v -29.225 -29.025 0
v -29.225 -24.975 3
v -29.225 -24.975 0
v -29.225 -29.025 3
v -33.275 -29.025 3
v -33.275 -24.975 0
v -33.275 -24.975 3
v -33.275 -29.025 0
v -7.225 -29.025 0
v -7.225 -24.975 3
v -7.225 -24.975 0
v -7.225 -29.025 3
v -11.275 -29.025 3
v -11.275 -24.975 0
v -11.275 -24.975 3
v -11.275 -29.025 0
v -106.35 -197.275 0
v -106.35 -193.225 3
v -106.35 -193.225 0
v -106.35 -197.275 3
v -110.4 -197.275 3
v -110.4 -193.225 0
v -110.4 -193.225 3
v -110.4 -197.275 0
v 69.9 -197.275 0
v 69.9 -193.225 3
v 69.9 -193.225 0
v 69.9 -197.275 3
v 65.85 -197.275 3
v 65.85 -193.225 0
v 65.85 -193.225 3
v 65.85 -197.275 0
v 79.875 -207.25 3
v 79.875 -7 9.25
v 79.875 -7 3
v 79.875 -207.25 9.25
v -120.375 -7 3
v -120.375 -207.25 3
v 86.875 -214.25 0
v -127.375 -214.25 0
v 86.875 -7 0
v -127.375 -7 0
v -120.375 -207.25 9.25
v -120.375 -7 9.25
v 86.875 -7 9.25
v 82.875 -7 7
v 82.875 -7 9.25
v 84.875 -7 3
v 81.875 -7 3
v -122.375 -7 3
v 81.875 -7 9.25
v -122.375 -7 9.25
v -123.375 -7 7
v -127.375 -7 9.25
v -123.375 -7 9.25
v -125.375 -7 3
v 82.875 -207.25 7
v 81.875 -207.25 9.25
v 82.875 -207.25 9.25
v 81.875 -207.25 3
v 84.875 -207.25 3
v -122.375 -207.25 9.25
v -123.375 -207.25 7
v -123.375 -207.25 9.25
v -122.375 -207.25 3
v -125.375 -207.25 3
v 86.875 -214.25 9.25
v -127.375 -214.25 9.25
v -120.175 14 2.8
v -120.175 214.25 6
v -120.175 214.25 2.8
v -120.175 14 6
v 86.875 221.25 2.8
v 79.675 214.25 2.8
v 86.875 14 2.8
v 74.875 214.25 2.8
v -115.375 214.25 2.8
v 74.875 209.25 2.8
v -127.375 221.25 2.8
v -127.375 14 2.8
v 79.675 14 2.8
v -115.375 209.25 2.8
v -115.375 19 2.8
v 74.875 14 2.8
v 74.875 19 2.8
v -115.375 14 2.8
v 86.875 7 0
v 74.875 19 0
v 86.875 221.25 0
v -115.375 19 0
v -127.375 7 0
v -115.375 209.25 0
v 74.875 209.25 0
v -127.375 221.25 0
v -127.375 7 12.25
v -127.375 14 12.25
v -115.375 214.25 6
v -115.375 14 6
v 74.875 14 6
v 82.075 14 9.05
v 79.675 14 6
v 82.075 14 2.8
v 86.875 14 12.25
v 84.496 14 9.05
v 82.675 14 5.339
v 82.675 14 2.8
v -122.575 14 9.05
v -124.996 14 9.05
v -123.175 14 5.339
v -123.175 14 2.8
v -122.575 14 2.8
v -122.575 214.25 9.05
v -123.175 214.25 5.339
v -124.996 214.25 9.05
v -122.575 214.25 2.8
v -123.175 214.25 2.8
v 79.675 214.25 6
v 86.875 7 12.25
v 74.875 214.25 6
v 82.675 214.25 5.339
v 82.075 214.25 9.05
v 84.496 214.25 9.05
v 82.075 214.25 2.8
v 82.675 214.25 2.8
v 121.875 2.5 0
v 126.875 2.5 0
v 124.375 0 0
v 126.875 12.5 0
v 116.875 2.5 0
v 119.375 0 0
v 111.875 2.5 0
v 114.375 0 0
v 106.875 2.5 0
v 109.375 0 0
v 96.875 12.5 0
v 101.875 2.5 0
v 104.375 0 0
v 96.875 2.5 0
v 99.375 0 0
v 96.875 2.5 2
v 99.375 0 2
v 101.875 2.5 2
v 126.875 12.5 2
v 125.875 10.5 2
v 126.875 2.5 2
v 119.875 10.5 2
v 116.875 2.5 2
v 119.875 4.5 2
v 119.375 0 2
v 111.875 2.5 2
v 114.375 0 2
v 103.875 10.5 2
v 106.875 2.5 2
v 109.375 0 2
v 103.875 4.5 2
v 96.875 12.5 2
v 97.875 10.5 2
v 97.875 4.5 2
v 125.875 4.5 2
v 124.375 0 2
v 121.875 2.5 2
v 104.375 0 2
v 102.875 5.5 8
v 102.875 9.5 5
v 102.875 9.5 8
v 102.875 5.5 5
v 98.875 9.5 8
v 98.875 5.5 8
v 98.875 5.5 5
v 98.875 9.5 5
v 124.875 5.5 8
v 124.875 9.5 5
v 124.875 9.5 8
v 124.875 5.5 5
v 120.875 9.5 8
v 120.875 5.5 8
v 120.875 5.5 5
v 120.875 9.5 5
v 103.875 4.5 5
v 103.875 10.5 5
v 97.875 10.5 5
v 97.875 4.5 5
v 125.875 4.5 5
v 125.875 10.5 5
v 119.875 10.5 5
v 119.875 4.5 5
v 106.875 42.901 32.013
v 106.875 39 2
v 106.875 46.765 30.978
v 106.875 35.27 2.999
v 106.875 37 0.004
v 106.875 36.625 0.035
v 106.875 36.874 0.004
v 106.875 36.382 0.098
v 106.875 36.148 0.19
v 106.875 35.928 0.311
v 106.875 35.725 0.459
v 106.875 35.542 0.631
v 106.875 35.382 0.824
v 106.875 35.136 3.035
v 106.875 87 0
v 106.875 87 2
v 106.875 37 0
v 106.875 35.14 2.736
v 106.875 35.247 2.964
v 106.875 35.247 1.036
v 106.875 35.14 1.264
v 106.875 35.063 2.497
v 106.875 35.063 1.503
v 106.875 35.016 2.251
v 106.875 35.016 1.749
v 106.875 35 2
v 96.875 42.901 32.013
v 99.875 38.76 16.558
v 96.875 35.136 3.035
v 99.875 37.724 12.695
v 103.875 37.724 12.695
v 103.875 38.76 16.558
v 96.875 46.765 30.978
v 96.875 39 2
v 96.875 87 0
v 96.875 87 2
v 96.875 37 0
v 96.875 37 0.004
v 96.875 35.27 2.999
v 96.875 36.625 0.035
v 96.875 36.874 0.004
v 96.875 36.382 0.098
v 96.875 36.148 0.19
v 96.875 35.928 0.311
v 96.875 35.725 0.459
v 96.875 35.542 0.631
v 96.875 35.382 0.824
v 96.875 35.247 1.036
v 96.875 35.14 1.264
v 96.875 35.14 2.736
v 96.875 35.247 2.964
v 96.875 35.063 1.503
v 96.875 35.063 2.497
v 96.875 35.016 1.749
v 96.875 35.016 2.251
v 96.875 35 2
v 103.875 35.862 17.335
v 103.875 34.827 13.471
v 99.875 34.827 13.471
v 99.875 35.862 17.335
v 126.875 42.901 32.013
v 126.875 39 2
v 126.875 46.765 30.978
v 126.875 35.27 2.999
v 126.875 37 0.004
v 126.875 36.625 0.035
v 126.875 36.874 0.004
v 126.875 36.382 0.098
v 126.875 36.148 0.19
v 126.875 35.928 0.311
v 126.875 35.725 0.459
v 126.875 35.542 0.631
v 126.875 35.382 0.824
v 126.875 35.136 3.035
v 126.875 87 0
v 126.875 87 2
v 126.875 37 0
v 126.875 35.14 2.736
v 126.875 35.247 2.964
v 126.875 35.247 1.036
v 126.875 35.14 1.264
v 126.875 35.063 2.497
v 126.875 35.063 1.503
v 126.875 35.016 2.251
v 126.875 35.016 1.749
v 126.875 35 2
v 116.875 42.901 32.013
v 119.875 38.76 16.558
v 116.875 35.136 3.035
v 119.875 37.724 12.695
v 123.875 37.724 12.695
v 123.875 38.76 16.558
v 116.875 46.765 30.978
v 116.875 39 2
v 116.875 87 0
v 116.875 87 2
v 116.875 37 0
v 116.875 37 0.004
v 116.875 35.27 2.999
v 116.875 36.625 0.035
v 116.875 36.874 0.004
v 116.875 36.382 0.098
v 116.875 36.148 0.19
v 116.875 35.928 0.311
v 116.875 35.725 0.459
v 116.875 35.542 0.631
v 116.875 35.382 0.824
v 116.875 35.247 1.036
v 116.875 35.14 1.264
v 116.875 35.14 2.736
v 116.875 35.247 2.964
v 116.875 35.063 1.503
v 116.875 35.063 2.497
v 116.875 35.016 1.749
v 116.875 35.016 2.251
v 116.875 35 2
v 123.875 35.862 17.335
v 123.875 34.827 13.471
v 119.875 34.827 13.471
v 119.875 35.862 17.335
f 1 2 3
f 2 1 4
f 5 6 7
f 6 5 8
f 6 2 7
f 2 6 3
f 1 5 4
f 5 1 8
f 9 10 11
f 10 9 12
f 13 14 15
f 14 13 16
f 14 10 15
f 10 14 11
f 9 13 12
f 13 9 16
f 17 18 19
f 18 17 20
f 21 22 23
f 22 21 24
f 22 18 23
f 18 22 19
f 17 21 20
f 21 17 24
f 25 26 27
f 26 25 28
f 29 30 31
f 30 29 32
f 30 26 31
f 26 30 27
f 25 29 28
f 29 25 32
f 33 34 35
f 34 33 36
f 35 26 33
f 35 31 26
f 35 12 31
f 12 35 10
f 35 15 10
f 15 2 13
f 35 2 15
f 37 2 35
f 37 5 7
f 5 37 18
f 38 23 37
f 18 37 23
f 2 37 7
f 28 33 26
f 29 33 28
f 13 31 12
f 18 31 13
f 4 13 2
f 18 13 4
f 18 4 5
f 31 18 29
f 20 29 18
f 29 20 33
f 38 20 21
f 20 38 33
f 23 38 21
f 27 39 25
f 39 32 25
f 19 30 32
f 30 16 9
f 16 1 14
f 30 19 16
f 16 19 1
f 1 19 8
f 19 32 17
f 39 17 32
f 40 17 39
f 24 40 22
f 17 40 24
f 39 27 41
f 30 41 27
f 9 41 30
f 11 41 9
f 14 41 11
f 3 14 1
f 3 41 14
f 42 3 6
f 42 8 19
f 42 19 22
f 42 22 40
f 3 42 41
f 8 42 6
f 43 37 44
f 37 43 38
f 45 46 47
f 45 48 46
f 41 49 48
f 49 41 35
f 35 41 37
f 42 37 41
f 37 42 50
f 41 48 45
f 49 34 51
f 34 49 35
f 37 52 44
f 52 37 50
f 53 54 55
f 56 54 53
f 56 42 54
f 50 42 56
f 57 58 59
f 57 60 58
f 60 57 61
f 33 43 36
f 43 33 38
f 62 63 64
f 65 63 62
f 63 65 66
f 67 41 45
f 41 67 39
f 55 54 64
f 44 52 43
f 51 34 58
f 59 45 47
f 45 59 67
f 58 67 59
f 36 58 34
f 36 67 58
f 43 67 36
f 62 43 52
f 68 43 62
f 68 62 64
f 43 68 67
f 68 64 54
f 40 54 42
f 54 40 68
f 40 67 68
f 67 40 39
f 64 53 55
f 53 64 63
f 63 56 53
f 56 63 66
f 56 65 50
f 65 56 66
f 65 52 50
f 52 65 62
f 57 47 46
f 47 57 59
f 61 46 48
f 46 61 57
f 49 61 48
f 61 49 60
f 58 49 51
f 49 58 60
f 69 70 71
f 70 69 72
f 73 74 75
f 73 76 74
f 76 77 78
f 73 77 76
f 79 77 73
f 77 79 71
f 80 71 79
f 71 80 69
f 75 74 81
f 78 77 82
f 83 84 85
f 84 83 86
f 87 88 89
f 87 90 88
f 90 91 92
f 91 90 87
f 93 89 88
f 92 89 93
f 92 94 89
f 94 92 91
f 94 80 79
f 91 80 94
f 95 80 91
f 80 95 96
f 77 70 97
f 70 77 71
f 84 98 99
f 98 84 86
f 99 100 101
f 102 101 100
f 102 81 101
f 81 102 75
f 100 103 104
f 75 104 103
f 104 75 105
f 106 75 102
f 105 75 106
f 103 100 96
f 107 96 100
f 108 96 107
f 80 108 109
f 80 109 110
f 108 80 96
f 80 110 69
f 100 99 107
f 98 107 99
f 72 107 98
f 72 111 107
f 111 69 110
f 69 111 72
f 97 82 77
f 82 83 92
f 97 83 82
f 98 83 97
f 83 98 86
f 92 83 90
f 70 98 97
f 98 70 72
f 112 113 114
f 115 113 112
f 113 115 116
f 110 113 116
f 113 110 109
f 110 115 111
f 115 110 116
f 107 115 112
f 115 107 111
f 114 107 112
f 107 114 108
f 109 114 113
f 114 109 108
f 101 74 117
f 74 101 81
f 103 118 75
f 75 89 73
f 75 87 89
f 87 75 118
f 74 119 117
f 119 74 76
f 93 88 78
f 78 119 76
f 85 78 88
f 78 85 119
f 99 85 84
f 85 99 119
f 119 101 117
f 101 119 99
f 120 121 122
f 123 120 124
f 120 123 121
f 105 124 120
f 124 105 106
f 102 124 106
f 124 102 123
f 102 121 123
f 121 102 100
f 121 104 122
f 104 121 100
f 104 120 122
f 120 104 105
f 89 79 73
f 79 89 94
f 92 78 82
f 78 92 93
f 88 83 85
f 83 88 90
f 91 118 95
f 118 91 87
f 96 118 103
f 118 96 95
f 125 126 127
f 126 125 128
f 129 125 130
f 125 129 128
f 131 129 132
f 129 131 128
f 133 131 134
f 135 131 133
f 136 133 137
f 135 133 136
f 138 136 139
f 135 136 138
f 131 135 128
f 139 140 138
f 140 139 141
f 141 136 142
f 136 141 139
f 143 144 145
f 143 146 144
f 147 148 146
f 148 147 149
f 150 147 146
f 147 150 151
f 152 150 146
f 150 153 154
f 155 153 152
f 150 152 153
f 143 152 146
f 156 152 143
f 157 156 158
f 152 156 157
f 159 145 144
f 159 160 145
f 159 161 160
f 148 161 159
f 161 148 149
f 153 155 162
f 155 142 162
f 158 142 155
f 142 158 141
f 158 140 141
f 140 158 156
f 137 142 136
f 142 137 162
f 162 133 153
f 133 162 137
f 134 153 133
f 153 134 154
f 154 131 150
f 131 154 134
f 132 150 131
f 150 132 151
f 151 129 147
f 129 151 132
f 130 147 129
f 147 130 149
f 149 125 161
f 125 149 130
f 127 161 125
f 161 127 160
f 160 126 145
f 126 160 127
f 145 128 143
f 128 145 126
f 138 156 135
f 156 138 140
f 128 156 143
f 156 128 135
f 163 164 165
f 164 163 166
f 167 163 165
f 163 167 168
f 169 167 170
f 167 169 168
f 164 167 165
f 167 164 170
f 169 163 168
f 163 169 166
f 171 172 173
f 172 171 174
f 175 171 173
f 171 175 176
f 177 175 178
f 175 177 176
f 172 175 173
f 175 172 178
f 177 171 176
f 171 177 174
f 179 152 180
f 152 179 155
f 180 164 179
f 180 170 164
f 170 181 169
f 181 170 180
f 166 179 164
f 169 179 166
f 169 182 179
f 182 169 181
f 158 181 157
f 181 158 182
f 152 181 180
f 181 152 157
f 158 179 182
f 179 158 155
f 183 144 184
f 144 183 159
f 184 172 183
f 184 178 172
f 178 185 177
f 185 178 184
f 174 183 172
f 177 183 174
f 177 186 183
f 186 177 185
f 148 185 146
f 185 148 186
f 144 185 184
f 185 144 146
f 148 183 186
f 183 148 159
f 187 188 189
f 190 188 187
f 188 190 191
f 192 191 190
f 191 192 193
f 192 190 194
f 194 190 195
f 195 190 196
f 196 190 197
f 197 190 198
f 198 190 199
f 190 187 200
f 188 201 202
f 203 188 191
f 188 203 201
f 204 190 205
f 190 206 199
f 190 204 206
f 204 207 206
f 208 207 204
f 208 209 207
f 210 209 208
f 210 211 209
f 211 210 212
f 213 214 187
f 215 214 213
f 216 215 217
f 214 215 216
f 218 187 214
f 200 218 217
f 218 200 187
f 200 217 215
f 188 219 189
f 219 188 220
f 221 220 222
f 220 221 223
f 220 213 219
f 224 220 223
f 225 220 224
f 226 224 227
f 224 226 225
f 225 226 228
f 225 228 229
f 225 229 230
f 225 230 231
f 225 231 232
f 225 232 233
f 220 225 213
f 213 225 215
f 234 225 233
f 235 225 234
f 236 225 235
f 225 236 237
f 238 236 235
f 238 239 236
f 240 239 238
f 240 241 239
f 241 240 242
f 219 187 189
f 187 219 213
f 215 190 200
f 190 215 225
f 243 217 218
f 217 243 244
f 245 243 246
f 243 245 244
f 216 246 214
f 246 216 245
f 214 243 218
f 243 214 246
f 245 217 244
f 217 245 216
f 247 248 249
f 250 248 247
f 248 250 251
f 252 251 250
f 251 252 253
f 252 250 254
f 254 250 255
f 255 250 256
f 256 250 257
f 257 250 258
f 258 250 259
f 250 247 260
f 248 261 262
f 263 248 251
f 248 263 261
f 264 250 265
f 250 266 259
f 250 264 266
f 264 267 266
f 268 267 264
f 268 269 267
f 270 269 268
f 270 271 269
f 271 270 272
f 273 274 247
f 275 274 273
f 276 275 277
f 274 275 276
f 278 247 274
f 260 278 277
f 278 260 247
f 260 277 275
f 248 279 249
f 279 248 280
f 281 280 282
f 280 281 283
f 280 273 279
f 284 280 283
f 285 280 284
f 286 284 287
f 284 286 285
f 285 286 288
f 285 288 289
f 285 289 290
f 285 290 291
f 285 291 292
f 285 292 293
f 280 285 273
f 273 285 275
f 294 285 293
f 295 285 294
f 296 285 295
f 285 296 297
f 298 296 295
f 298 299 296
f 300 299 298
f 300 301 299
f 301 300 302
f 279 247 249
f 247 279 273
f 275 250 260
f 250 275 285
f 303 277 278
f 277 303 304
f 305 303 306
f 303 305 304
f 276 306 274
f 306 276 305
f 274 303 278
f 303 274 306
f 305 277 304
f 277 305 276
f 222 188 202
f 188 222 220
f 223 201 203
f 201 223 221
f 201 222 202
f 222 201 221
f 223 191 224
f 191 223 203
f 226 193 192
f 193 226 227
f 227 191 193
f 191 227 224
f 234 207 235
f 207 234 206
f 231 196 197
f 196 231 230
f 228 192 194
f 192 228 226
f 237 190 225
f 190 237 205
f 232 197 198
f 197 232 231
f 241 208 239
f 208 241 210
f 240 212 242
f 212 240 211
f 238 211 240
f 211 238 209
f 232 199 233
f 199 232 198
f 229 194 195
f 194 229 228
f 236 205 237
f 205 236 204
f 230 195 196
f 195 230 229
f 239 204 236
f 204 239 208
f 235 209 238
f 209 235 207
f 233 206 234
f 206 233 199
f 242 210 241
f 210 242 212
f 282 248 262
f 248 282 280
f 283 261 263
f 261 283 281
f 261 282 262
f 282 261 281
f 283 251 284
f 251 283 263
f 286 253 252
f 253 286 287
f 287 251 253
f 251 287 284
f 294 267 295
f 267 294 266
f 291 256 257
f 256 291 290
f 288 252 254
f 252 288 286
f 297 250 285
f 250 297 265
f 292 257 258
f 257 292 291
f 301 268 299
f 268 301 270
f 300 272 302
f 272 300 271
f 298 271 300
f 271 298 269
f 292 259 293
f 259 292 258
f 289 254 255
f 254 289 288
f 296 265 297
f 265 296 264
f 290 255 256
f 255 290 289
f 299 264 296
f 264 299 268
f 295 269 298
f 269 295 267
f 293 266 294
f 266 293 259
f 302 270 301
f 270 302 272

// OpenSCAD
// Parametric HueForge Frame Generator

/* [Features] */
// The bottom of the frame is what the picture sits in. This is required.
FrameBottom = true;
// The top of the frame has the border and holds the picture in place. This is required.
FrameTop = true;
// A hook allows you to hang the picture on a wall.
Hook = true;
// Legs allow you to stand up the picture on a flat surface.
Legs = true;

/* [Picture Settings] */
// Height of the picture (mm).
PictureHeight = 200; // [25:1:400]
// Width of the picture (mm).
PictureWidth = 200; // [25:1:400]
// Thickness of the picture (mm).
PictureDepth = 3; // [1:0.1:10]
// Extra space inside the frame (mm).
PictureTolerance = 0.25; // [0:0.05:2]


/* [Frame Settings] */
// Width of the border around the picture. Larger borders will cover more of the picture (mm).
Border = 12; //[12:1:30]
// Tolerance for the push-to-fit pins on the hook/legs, if enabled (mm).
PushFitTolerance= 0.05; // [0:0.01:1]
// Tolerance for the slide-to-fit keys that interlock the top and bottom of the frame (mm).
SlideFitTolerance= 0.20; // [0:0.01:0.4]

/* [Hook Settings] */
// Width of each tooth on the hook (mm).
HookToothSize = 5; // [3:1:10]
// Width of the entire hook (mm).
HookWidth = 30; // [20:1:50]
// Distance between the hook and the picture frame (mm).
HookDistance = 5; // [3:1:10]

/* [Legs Settings] */
// The length of the leg feet. This number should ideally be no less than a quarter of your picture height (mm).
LegLength = 50; // [25:1:100]
// Angle in degrees to rotate your picture towards a horizontal position (i.e. 0 is straight up, perpendicular with the floor).
LegAngle = 15; // [0:1:80]
// Space away from the edge of the picture frame to place the leg pin holes. This must not be more than half of the frame width (mm).
LegMargins = 10; // [0:1:150]

/* [Hidden] */
BackAndFrontDepth = 3; // Minimum: 2
WallsWidth = 7; // Minimum: 7 (smaller decreases strength of lid keys)

HookPinMargins = 2;
HookHeight = 10;
PinSize = 4;

LegWidth = 10; // Minimum: PinSize

TolerantWidth = PictureWidth + PictureTolerance;
TolerantHeight = PictureHeight + PictureTolerance;
TolerantDepth = PictureDepth + PictureTolerance;
    
module lid_key(negative) {
    
    TopPos = BackAndFrontDepth * 2 + TolerantDepth;
    RightPos = WallsWidth;
    KeyPositions = [[RightPos - 2, BackAndFrontDepth], [RightPos - 4, BackAndFrontDepth + 4]];
    
    if(negative) {        
        polygon([
            [0,0], 
            [0, TopPos],
            [2, TopPos],
            [2, KeyPositions[0][1]],
            KeyPositions[0],
            KeyPositions[1],
            [KeyPositions[1][0], TopPos],
            [RightPos, TopPos], 
            [RightPos, 0]
        ]);
    } else { 
        AngleDiff = SlideFitTolerance * sin(atan((KeyPositions[0][0] - KeyPositions[1][0]) / (KeyPositions[1][1] - KeyPositions[0][1])));
        polygon([
            [2 + SlideFitTolerance, KeyPositions[0][1] + SlideFitTolerance], 
            [2 + SlideFitTolerance, TopPos + SlideFitTolerance],
            [KeyPositions[1][0] - SlideFitTolerance, TopPos + SlideFitTolerance],
            [KeyPositions[1][0] - SlideFitTolerance, KeyPositions[1][1] - AngleDiff],
            [KeyPositions[0][0] - SlideFitTolerance - AngleDiff * 2, KeyPositions[0][1] + SlideFitTolerance]
        ]);
    }
}

module frame_bottom() {
    // Back
    translate([WallsWidth, WallsWidth, 0])
        difference() {
            cube([TolerantWidth, TolerantHeight, BackAndFrontDepth]);
            // Pin holes for hook, if enabled
            if(Hook) {
                translate([TolerantWidth / 2 - HookWidth / 2 + HookPinMargins - PushFitTolerance / 2, TolerantHeight - Border - 10 - PushFitTolerance / 2, -1])
                    cube([PinSize + PushFitTolerance, PinSize + PushFitTolerance, BackAndFrontDepth + 2]);
                translate([TolerantWidth / 2 + HookWidth / 2 - HookPinMargins - PinSize - PushFitTolerance / 2, TolerantHeight - Border - 10 - PushFitTolerance / 2, -1])
                    cube([PinSize + PushFitTolerance, PinSize + PushFitTolerance, BackAndFrontDepth + 2]);
            }
            
            // Pin holes for legs, if enabled
            if(Legs) {
                translate([LegMargins - PushFitTolerance / 2, 10 - PushFitTolerance / 2, -1])
                    cube([PinSize + PushFitTolerance, PinSize + PushFitTolerance, BackAndFrontDepth + 2]);
                translate([TolerantWidth - LegMargins - PinSize - PushFitTolerance / 2, 10 - PushFitTolerance / 2, -1])
                    cube([PinSize + PushFitTolerance, PinSize + PushFitTolerance, BackAndFrontDepth + 2]);
            }
        }
    
    // Bottom wall
    cube([TolerantWidth + WallsWidth * 2, WallsWidth, TolerantDepth + BackAndFrontDepth * 2]);
    
    
    // Left wall
    rotate([90, 0, 180])
        translate([-WallsWidth, 0, WallsWidth])
            linear_extrude(TolerantHeight)
            lid_key(true);
        
    // Right wall
    rotate([90, 0, 0])
        translate([TolerantWidth + WallsWidth, 0, -TolerantHeight - WallsWidth])
            linear_extrude(TolerantHeight)
            lid_key(true);
}

module frame_top() {
    module frame_top_side() {
        // Border top
        cube([WallsWidth + SlideFitTolerance, TolerantHeight, BackAndFrontDepth - SlideFitTolerance]);
        // Spacer
        translate([WallsWidth + SlideFitTolerance, 0, 0])
            cube([Border - WallsWidth - SlideFitTolerance, TolerantHeight, BackAndFrontDepth * 2]);
        // Slide key
        rotate([90, 180, 0])
            translate([-WallsWidth, -BackAndFrontDepth * 3 - TolerantDepth, -TolerantHeight])
                linear_extrude(TolerantHeight)
                lid_key(false);
    }
    
    // Frame top sides
    translate([0, WallsWidth, 0]) {        
        frame_top_side();
        rotate([0, 0, 180])
            translate([-TolerantWidth - WallsWidth * 2, -TolerantHeight, 0])
                frame_top_side();
    }
    
    // Bottom border
    translate([0, TolerantHeight - Border + WallsWidth * 2, 0])
        cube([TolerantWidth + WallsWidth * 2, Border, BackAndFrontDepth - SlideFitTolerance]);
    
    // Top wall and border
    cube([TolerantWidth + WallsWidth * 2, Border, BackAndFrontDepth - SlideFitTolerance]);
    cube([TolerantWidth + WallsWidth * 2, WallsWidth, TolerantDepth + BackAndFrontDepth * 3]);
}

module hook() {
    // Base
    translate([0, HookToothSize / 2, 0])
        cube([HookWidth, HookHeight, 2]);
    
    // Teeth
    ToothSpareSpace = HookWidth % HookToothSize;
    for(i = [ToothSpareSpace / 2:HookToothSize:HookWidth - HookToothSize])
        linear_extrude(height = 2, convexity = 10, twist = 0)
            polygon(points=[[i,HookToothSize / 2],[i + HookToothSize / 2,0],[i + HookToothSize,HookToothSize / 2]], paths=[[0,1,2]]);
    
    // Pins
    translate([HookPinMargins, (HookHeight - PinSize) / 2 + HookToothSize / 2, 0]) {
        cube([PinSize, PinSize, HookDistance + BackAndFrontDepth]);
    }
    translate([HookWidth - HookPinMargins - PinSize, (HookHeight - PinSize) / 2 + HookToothSize / 2, 0]) {
        cube([PinSize, PinSize, HookDistance + BackAndFrontDepth]);
    }
    
    // Pins Standoffs
    translate([HookPinMargins - 1, (HookHeight - PinSize) / 2 - 1 + HookToothSize / 2, 0]) {
        cube([PinSize + 2, PinSize + 2, HookDistance]);
    }
    translate([HookWidth - HookPinMargins - PinSize - 1, (HookHeight - PinSize) / 2 - 1 + HookToothSize / 2, 0]) {
        cube([PinSize + 2, PinSize + 2, HookDistance]);
    }
    
}

module legs() {
    for(i = [1:1:2]) {
        // Foot
        translate([(LegWidth + 10) * (i - 1), 2, 0]) {
            cube([LegWidth, LegLength, 2]);
        }
        // Joint
        translate([(LegWidth + 10) * (i - 1), 2, 2]) {
            rotate([90, 0, 90])
                    cylinder(LegWidth, 2, 2, $fn=50);
        }
        // Leg
        translate([(LegWidth + 10) * (i - 1), 2 + 2, 2]) {
            rotate([90 - LegAngle, 0, 0]) {
                cube([LegWidth, 30, 4]);
                // Pin
                translate([LegWidth / 2 - PinSize / 2, 10, 4])
                    cube([PinSize, PinSize, BackAndFrontDepth]);
            }
        }
        
    }
    
}

// Calculate translation amounts to center all objects around 0,0 (approximate).
// The amount to translate depends on which features are enabled.
FrameTopYOffset = FrameTop ? -TolerantHeight / 2 : 0;
FrameBottomYOffset = FrameBottom ? -TolerantHeight / 2 : 0;
FramesYOffset = FrameTopYOffset + FrameBottomYOffset + (FrameTopYOffset && FrameBottomYOffset ? - WallsWidth * 2 : 0);
FramesXOffset = FrameTop || FrameBottom ? -(TolerantWidth + WallsWidth * 2) / 2 : 0;
HookXOffset = Hook ? -(HookWidth) / 2 : 0;
LegsXOffset = Legs ? -((LegWidth) * 2 + 10) / 2 : 0;
HookLegsXOffset = min(HookXOffset, LegsXOffset) - (FrameTop || FrameBottom ?  WallsWidth * 0.75 : 0);

translate([FramesXOffset + HookLegsXOffset, FramesYOffset, 0]) {
    
        
    if(FrameBottom) {
            frame_bottom();
    }

    if(FrameTop) {
            if(FrameBottom) {
                translate([0, TolerantHeight + WallsWidth * 3, 0])
                    frame_top();
            } else {
                frame_top();
            }
    }
    
    // Center hook and legs along X axis (approximately) based on whether top and/or bottom frame are enabled
    HookLegsYOffset = (FrameTop ? TolerantHeight / 2 : 0) + (FrameBottom ? TolerantHeight / 2 : 0) + (FrameTop && FrameBottom ? WallsWidth * 2 : 0);
    translate([0, HookLegsYOffset, 0]) {

        if(Hook)
            if(FrameBottom || FrameTop) {
                translate([TolerantWidth + WallsWidth * 2 + 10, 0, 0])
                    hook();
            } else {
                hook();
            }
            
        if(Legs)
            if((FrameBottom || FrameTop) && Hook) {
                translate([TolerantWidth + WallsWidth * 2 + 10, HookToothSize + HookHeight + 20, 0])
                    legs();
            } else if(FrameBottom || FrameTop) {
                translate([TolerantWidth + WallsWidth * 2 + 10, 0, 0])
                    legs();
            } else if(Hook) {
                translate([0, HookToothSize + HookHeight + 20, 0])
                    legs();
            } else {
                legs();
            }

    }
}
